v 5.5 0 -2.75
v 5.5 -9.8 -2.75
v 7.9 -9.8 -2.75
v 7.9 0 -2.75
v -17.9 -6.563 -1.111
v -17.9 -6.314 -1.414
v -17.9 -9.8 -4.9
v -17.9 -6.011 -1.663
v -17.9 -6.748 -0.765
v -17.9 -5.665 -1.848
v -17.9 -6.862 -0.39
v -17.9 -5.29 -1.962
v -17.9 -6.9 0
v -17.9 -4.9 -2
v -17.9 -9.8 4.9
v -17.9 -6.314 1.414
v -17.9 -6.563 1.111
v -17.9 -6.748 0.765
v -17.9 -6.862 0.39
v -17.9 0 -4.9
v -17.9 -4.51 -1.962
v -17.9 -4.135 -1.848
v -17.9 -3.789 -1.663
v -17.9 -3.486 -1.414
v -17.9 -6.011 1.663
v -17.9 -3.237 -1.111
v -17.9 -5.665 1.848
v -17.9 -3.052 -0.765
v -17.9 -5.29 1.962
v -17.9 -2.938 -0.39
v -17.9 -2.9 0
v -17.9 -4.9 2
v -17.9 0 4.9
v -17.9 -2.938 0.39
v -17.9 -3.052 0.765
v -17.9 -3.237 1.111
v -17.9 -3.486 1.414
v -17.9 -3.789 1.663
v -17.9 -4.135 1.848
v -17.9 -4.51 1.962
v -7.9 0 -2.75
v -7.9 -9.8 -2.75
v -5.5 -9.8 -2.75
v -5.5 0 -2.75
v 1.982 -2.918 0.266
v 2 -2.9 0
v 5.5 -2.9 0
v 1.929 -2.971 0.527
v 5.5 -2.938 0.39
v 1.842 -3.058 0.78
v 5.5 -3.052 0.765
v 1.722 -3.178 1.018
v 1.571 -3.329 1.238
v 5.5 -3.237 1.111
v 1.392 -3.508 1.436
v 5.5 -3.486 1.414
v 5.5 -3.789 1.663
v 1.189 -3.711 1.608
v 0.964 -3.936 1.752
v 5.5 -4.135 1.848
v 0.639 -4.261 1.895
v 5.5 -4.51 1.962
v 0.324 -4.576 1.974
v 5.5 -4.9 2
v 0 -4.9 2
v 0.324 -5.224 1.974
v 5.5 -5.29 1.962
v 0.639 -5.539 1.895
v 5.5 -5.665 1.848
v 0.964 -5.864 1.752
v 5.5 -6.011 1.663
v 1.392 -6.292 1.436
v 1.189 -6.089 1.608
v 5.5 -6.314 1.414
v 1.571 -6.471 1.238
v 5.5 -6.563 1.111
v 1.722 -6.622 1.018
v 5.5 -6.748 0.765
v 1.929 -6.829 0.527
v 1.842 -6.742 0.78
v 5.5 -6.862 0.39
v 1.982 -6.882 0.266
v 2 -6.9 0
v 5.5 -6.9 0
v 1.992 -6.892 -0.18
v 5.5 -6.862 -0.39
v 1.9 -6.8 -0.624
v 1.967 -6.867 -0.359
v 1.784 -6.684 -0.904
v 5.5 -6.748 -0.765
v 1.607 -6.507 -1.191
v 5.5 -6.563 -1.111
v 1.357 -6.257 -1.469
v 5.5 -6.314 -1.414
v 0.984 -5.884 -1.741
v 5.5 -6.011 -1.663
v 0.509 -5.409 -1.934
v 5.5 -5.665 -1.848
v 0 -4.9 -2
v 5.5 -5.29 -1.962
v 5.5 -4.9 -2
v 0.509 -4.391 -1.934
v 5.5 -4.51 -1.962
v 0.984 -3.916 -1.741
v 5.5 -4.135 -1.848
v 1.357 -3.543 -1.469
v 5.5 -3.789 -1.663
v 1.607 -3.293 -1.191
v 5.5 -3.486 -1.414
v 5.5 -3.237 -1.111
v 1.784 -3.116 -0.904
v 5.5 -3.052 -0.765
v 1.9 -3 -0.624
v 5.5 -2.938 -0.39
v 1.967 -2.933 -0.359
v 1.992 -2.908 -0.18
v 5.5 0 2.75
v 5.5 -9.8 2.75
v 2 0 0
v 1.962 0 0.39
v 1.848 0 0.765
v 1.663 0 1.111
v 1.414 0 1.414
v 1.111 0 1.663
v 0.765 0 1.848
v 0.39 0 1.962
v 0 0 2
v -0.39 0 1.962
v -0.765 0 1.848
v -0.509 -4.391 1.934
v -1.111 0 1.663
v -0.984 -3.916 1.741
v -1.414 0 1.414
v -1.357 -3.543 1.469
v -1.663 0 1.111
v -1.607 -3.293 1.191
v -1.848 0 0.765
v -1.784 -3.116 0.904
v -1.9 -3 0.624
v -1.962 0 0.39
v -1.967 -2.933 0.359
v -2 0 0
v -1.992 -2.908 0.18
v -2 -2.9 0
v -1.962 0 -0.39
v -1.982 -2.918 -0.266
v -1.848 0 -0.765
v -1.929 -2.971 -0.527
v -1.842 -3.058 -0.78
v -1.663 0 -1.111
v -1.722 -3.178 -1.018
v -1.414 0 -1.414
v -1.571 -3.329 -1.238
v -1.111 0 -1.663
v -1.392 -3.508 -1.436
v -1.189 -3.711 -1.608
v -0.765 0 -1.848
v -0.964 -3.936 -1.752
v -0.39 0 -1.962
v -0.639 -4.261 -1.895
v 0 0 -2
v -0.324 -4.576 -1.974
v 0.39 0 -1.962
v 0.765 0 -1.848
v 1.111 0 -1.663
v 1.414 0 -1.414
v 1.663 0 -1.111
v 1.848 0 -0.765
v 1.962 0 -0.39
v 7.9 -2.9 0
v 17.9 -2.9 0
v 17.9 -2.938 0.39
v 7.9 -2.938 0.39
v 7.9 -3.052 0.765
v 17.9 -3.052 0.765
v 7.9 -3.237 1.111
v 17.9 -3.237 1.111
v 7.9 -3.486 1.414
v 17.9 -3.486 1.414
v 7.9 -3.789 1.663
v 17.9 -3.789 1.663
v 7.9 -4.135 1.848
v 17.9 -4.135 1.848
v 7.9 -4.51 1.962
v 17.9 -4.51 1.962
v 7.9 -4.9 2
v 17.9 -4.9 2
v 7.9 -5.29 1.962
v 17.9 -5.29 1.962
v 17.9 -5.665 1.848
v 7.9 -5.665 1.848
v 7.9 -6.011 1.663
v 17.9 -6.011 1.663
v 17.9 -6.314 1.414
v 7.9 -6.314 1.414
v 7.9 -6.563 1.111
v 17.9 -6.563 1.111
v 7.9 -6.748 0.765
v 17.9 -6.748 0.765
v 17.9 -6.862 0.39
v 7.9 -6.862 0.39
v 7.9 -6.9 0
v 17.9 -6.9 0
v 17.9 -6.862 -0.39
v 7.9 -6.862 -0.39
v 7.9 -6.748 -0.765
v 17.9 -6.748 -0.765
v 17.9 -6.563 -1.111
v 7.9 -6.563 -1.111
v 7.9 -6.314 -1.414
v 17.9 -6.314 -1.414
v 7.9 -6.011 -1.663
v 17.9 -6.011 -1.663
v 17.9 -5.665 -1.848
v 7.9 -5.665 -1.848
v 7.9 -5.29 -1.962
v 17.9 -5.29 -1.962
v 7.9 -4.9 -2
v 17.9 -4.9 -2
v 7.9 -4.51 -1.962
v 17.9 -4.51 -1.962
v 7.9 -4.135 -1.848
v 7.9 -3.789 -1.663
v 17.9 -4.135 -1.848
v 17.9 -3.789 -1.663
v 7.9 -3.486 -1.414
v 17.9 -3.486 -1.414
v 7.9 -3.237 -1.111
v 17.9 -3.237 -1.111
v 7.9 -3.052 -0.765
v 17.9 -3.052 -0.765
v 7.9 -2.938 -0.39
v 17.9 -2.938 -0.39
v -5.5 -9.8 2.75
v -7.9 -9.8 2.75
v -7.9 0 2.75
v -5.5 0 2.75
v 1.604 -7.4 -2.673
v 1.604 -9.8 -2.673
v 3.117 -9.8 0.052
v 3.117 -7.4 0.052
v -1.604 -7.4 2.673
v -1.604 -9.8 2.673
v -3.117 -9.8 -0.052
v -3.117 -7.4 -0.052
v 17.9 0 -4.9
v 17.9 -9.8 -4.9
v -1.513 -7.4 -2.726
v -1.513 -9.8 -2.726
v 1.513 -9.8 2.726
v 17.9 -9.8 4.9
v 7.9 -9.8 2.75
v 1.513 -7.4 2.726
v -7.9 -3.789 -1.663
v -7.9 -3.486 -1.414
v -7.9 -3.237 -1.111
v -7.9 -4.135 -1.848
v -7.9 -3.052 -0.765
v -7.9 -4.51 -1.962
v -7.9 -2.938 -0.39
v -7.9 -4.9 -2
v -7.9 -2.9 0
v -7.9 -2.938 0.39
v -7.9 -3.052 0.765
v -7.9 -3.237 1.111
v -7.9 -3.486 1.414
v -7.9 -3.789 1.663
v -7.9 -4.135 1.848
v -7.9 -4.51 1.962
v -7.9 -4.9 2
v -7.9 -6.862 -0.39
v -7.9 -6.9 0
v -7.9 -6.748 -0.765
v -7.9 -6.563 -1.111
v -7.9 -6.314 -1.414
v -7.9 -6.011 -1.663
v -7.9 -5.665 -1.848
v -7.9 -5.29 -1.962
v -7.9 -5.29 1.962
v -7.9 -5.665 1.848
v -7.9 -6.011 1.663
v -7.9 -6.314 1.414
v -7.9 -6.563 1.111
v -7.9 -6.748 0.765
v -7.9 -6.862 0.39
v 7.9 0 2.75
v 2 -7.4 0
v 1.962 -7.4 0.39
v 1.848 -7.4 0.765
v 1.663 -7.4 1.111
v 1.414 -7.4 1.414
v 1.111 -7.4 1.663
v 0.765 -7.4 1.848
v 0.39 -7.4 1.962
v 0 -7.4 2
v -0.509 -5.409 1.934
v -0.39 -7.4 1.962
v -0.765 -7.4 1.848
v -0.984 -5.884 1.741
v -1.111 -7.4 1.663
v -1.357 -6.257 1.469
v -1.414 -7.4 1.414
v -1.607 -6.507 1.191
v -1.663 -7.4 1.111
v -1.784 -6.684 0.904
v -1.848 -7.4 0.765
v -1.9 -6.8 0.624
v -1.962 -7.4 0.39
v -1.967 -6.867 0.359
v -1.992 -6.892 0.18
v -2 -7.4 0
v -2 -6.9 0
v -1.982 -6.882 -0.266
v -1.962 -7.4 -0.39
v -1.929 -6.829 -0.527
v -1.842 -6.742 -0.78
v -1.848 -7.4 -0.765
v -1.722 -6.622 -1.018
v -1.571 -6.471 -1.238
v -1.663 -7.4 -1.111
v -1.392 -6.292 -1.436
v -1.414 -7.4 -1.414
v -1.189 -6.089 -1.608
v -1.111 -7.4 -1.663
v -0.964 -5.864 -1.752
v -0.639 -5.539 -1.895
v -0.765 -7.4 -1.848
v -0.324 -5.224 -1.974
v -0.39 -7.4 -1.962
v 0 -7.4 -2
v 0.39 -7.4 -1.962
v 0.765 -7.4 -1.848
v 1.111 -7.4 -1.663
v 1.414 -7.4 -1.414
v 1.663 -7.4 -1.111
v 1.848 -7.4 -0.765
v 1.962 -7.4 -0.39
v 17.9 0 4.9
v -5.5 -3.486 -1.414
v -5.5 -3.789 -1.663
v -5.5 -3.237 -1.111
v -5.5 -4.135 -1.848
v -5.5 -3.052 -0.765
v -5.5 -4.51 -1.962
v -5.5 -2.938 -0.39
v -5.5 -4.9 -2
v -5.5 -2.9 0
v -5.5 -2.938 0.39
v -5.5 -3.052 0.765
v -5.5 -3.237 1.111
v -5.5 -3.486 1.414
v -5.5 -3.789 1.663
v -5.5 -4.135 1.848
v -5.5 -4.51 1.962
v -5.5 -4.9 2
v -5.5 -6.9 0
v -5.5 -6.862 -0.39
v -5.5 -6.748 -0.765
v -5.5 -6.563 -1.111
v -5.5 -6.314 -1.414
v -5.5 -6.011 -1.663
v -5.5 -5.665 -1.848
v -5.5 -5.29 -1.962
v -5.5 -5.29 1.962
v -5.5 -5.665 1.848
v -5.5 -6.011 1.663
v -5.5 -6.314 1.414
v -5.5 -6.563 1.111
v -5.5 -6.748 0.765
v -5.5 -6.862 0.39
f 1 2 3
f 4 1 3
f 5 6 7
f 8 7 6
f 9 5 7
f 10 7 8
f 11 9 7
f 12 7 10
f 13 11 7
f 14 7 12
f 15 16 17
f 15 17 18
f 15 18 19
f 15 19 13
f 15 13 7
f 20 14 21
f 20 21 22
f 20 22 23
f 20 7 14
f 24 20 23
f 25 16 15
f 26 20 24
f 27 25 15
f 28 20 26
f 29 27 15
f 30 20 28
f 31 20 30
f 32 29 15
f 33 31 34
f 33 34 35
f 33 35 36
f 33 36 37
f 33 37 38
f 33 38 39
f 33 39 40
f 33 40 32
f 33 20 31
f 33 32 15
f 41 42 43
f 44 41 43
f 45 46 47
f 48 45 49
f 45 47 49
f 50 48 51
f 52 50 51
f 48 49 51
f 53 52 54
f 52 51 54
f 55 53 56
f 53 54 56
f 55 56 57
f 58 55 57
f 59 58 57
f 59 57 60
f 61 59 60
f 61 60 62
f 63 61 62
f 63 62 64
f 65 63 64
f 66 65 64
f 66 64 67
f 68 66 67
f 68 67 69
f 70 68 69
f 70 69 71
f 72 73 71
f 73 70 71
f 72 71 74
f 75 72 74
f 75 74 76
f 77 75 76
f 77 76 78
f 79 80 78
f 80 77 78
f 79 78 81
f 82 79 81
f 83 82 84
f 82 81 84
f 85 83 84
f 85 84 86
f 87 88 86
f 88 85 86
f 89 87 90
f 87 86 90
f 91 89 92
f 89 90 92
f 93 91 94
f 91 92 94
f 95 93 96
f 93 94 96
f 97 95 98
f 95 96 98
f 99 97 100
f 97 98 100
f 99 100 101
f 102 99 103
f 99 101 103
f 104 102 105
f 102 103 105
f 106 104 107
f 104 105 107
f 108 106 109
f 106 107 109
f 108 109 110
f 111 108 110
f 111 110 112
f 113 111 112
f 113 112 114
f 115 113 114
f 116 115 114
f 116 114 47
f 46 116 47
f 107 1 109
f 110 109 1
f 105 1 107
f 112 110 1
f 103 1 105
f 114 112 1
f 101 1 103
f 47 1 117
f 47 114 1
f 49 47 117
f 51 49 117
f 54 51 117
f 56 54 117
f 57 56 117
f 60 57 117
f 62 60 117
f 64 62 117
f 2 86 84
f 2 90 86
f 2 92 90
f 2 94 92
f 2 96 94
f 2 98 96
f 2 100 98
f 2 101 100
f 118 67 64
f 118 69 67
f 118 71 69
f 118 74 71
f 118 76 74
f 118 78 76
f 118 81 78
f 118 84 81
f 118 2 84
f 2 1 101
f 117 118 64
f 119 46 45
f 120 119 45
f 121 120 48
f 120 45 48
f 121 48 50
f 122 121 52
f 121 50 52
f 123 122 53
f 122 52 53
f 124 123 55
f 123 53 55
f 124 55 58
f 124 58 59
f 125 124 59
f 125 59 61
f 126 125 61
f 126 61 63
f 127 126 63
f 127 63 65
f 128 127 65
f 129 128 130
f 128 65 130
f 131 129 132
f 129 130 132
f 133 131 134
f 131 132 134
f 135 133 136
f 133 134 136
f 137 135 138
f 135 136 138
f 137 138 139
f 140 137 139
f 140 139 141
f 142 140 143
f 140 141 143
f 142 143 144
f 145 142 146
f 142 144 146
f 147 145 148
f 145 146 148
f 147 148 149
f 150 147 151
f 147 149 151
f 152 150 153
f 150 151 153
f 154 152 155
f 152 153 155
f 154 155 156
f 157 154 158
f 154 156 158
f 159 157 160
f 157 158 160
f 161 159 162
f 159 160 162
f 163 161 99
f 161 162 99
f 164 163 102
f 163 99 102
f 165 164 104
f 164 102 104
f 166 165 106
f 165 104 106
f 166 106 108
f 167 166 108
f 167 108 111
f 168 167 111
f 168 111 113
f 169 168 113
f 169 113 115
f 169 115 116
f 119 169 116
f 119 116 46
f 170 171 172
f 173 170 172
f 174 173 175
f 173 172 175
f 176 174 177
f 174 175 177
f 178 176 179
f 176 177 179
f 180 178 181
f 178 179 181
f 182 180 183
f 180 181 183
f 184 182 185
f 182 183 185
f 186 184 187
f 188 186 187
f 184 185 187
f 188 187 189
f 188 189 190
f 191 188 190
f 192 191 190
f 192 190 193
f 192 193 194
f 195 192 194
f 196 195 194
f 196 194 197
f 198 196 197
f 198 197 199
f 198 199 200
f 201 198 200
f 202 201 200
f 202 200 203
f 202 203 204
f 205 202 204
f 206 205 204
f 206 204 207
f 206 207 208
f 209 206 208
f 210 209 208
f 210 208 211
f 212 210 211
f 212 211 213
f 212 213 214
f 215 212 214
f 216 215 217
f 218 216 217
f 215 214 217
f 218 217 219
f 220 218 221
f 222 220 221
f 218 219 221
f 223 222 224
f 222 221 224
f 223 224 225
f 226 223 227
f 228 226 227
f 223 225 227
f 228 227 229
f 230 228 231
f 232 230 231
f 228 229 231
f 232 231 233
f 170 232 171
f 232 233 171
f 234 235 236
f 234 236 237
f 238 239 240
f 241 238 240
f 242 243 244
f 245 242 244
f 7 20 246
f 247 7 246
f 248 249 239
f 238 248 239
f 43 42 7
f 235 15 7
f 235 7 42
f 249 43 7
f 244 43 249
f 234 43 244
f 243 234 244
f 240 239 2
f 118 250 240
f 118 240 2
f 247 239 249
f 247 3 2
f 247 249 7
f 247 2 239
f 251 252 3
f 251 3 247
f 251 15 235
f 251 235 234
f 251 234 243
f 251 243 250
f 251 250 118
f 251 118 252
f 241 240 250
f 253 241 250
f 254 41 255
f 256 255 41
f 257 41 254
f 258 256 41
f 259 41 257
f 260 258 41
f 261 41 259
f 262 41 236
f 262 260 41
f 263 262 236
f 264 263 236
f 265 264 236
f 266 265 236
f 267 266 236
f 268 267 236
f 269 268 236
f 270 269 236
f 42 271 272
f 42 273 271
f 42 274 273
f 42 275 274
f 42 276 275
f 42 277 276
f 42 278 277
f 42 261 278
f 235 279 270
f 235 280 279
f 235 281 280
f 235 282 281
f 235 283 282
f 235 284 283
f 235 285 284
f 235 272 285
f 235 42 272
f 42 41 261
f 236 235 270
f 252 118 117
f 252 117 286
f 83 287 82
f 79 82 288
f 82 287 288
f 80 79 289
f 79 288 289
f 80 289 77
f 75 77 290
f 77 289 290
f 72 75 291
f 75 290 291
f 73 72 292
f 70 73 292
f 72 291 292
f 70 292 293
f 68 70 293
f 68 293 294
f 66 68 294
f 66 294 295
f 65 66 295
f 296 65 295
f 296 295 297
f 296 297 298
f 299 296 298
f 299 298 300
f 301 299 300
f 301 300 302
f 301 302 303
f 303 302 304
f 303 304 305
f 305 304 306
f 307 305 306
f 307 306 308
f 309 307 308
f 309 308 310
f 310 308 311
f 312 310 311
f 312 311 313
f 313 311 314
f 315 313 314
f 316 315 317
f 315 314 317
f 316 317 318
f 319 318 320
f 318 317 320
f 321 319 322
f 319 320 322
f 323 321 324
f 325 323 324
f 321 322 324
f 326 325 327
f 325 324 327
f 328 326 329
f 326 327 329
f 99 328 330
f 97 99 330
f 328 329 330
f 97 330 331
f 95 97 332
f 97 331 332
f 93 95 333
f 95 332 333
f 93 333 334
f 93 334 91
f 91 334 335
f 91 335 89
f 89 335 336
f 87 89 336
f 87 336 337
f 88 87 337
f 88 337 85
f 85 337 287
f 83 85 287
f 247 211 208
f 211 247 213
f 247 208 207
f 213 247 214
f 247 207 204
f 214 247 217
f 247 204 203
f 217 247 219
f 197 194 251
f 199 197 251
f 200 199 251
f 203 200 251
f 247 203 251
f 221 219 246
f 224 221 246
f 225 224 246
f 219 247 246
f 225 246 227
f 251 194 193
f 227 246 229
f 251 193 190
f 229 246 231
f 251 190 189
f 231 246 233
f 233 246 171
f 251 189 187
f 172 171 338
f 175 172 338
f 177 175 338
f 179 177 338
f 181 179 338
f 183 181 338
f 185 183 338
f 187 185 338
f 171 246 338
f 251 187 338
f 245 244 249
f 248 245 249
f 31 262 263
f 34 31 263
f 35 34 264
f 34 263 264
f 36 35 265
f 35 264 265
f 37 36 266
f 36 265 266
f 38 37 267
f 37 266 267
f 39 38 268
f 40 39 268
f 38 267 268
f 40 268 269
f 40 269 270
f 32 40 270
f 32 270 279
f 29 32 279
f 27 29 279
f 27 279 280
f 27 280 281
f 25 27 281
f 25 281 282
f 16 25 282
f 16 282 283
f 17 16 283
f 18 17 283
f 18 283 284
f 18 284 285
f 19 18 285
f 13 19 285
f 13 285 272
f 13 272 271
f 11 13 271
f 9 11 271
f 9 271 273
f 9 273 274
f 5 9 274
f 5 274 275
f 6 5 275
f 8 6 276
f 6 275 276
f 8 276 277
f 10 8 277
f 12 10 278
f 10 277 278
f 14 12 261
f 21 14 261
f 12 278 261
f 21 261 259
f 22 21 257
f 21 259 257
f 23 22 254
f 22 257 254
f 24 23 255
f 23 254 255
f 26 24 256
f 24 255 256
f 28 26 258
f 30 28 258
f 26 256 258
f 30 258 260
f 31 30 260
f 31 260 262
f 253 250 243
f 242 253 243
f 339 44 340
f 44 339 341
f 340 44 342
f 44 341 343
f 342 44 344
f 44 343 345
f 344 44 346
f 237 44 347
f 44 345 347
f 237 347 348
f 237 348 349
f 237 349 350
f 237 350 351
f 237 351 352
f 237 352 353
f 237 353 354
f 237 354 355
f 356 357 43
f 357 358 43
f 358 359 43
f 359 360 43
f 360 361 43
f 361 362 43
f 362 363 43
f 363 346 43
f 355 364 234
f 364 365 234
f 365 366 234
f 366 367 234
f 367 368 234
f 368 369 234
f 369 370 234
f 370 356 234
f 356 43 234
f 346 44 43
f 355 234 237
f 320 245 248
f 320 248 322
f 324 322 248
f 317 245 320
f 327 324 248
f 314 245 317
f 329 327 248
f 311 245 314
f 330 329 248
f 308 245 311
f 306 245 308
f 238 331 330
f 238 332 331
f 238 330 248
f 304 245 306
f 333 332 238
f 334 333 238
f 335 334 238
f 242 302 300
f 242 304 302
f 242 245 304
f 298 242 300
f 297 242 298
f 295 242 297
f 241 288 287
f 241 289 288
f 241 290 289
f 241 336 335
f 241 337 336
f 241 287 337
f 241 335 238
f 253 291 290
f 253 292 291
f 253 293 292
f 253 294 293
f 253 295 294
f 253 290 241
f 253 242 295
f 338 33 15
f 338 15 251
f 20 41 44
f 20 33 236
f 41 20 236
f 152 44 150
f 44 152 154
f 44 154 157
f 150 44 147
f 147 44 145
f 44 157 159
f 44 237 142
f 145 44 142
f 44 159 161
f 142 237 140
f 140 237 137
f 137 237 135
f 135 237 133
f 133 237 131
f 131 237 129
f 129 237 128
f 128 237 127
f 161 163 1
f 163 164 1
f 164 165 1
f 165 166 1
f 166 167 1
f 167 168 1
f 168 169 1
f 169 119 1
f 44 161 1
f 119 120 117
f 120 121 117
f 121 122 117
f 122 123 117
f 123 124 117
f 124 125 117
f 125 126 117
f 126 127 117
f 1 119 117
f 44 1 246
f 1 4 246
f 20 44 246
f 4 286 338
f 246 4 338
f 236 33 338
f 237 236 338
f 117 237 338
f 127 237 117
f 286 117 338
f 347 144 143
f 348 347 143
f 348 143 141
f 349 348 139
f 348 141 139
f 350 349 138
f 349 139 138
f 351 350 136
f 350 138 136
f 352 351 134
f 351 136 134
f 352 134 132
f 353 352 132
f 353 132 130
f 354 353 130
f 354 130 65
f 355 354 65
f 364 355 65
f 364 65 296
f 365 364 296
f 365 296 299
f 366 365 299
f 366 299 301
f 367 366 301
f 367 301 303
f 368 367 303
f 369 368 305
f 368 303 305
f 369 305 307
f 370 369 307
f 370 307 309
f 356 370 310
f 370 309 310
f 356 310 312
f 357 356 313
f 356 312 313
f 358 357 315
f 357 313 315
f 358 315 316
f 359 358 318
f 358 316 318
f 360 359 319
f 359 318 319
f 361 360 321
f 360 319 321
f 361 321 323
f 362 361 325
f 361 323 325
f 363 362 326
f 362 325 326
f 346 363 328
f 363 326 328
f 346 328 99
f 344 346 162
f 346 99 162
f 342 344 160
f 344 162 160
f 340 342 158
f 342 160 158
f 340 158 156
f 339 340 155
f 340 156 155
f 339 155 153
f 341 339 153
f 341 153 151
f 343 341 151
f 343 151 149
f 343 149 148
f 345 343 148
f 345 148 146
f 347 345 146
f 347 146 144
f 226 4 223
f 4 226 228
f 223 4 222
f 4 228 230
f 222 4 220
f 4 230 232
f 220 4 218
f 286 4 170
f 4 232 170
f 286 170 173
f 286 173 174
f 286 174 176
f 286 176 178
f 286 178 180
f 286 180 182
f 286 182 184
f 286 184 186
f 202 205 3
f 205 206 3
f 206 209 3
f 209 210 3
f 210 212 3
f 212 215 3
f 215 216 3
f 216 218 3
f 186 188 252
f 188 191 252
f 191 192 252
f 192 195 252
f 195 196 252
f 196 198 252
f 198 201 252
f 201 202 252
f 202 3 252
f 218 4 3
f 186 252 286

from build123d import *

# Parameters (mm, degrees)
F0_W     = 35.8
F0_H     = 9.8
F1_DEPTH = 9.8
F2_R     = 2
F3_DEPTH = 25
F5_DEPTH = 2.4
F6_R     = 2
F7_DEPTH = 40
F8_W     = 2.4
F8_H     = 5.5
F9_DEPTH = 25


with BuildPart() as f1:
    # F0 (on Front) → F1 (new body)
    with BuildSketch(Plane.XZ):
        Rectangle(F0_W, F0_H)
    extrude(amount=F1_DEPTH)

    # F2 (on face) → F3 (cut)
    with BuildSketch(Plane.XZ.offset(9.8)):
        Circle(F2_R)
    extrude(amount=-F3_DEPTH, mode=Mode.SUBTRACT)

    # F4 (on face) → F5 (cut)
    with BuildSketch(Plane.XZ.offset(9.8)):
        Polygon((-1.603947, 2.673454), (-3.117252, -0.052332), (-1.513305, -2.725785), (1.603947, -2.673454), (3.117252, 0.052332), (1.513305, 2.725785), align=None)
    extrude(amount=-F5_DEPTH, mode=Mode.SUBTRACT)

    # F6 (on face) → F7 (cut)
    with BuildSketch(Plane.YZ.offset(17.9)):
        with Locations((-4.9, 0)):
            Circle(F6_R)
    extrude(amount=-F7_DEPTH, mode=Mode.SUBTRACT)

    # F8 (on face) → F9 (cut)
    with BuildSketch(Plane.XZ.offset(9.8)):
        with Locations((6.7, 0)):
            Rectangle(F8_W, F8_H)
        with Locations((-6.7, 0)):
            Rectangle(F8_W, F8_H)
    extrude(amount=-F9_DEPTH, mode=Mode.SUBTRACT)


solid = f1.part
